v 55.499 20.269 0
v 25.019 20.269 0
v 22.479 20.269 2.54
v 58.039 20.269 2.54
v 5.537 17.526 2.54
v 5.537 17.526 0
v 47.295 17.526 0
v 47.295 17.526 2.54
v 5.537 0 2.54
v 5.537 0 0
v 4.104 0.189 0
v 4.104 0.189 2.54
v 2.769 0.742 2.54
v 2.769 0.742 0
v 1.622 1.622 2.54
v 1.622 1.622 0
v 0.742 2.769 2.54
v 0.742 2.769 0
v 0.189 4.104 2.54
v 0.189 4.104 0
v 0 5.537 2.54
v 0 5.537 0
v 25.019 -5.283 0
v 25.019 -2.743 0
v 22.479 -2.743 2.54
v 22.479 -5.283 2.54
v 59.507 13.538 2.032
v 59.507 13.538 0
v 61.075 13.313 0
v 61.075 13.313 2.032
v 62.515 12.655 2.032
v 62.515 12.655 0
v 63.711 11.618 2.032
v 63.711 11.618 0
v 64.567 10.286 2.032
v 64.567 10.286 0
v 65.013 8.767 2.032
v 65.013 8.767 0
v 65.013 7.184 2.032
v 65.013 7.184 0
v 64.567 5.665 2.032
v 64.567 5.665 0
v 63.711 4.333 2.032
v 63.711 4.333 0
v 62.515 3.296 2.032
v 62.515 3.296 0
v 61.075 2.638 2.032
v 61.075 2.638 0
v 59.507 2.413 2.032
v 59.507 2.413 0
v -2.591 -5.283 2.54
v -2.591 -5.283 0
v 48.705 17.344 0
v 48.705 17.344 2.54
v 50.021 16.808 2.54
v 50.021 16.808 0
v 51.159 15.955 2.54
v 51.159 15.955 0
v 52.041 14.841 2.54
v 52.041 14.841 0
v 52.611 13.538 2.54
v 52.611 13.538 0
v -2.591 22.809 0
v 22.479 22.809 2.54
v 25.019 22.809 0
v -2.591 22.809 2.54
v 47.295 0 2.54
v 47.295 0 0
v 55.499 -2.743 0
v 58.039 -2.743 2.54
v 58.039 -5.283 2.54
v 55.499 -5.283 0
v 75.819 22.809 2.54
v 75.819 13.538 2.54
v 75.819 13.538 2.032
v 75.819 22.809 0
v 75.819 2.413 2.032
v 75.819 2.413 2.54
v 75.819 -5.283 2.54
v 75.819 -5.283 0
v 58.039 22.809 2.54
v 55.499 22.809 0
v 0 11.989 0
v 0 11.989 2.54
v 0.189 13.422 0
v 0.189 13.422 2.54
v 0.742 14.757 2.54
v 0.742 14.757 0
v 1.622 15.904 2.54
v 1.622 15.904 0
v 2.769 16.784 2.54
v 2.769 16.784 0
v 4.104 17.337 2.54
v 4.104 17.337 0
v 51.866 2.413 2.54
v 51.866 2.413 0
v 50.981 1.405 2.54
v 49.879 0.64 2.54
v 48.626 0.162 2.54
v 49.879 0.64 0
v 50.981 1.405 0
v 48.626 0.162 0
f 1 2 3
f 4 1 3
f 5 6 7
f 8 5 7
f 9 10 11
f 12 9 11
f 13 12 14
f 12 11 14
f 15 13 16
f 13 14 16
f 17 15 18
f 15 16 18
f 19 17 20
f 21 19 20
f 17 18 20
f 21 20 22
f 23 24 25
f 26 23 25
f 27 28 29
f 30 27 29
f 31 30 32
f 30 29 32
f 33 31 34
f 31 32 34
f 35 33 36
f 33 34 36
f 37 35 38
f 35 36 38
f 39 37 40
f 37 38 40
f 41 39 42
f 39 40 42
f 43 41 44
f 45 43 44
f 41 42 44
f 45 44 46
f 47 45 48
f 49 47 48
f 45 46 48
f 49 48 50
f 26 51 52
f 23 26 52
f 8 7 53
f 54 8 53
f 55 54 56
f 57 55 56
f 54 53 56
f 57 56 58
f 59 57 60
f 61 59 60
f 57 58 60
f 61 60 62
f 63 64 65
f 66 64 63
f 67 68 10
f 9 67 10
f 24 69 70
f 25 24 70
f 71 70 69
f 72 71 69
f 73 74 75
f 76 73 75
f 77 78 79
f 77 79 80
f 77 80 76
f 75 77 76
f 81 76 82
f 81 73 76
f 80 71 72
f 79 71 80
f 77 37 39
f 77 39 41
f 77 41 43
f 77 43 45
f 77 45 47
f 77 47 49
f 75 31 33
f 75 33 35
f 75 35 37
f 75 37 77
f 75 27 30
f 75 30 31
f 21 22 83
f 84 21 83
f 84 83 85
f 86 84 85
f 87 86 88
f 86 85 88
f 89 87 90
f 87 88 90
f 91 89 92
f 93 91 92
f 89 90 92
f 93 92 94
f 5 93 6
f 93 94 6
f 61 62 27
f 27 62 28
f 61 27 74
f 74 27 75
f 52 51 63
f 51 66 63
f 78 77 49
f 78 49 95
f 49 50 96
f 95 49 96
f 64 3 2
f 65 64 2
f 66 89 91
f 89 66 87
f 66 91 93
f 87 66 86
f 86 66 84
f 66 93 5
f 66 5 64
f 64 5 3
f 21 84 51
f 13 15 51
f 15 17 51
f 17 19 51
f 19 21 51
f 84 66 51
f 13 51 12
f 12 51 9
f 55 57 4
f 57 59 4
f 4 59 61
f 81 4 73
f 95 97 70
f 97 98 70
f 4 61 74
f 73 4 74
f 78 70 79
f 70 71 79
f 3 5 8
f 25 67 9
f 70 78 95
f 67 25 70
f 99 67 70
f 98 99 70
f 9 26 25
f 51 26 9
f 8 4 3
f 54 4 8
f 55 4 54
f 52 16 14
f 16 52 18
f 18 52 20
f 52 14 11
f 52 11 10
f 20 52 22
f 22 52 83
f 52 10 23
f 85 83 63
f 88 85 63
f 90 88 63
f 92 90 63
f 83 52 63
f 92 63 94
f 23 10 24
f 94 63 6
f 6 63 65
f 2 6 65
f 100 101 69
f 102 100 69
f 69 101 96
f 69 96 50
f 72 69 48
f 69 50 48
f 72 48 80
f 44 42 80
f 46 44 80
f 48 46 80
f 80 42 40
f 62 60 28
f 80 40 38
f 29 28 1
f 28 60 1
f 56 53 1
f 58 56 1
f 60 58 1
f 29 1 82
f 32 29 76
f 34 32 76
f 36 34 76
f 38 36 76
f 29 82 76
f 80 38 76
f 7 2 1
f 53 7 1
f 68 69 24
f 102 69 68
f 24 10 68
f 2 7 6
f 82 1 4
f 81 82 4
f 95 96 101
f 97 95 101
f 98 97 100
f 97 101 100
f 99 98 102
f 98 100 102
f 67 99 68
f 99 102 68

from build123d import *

# Parameters (mm, degrees)
F1_DEPTH = 2.54
F3_DEPTH = 2.54
F5_DEPTH = 2.54
F6_DEPTH = 2.032


with BuildPart() as f1:
    # F0 (on Top) → F1 (new body)
    with BuildSketch(Plane.XY):
        with BuildLine():
            ThreePointArc((5.5372, 0), (1.621808, 1.621808), (0, 5.5372))
            Line((0, 5.5372), (0, 11.9888))
            ThreePointArc((0, 11.9888), (1.621808, 15.904192), (5.5372, 17.526))
            Line((5.5372, 17.526), (47.2948, 17.526))
            ThreePointArc((47.2948, 17.526), (50.617543, 16.418242), (52.610808, 13.5382))
            Line((52.610808, 13.5382), (59.50739, 13.5382))
            Line((59.50739, 13.5382), (75.818647, 13.5382))
            Line((75.818647, 13.5382), (75.818647, 20.2692))
            Line((75.818647, 20.2692), (-2.5908, 20.2692))
            Line((-2.5908, 20.2692), (-2.5908, -2.7432))
            Line((-2.5908, -2.7432), (75.818647, -2.7432))
            Line((75.818647, -2.7432), (75.818647, 2.413))
            Line((75.818647, 2.413), (59.50739, 2.413))
            Line((59.50739, 2.413), (51.866447, 2.413))
            ThreePointArc((51.866447, 2.413), (49.879492, 0.640267), (47.2948, 0))
            Line((47.2948, 0), (5.5372, 0))
        make_face()
    extrude(amount=F1_DEPTH)

    # F2 (on face) → F3 (join)
    with BuildSketch(Plane.XZ.offset(2.7432)):
        Polygon((-2.5908, 0), (25.018647, 0), (22.478647, 2.54), (-2.5908, 2.54), align=None)
        Polygon((58.038647, 2.54), (55.498647, 0), (75.818647, 0), (75.818647, 2.54), align=None)
    extrude(amount=F3_DEPTH)

    # F4 (on face) → F5 (join)
    with BuildSketch(Plane(origin=(0, 20.2692, 0), x_dir=(-1, 0, 0), z_dir=(0, 1, 0))):
        Polygon((-75.818647, 0), (-55.498647, 0), (-58.038647, 2.54), (-75.818647, 2.54), align=None)
        Polygon((-22.478647, 2.54), (-25.018647, 0), (2.5908, 0), (2.5908, 2.54), align=None)
    extrude(amount=F5_DEPTH)

    # F0 (on Top) → F6 (join)
    with BuildSketch(Plane.XY):
        with BuildLine():
            ThreePointArc((59.50739, 13.5382), (65.06999, 7.9756), (59.50739, 2.413))
            Line((59.50739, 2.413), (75.818647, 2.413))
            Line((75.818647, 2.413), (75.818647, 13.5382))
            Line((75.818647, 13.5382), (59.50739, 13.5382))
        make_face()
    extrude(amount=F6_DEPTH)


solid = f1.part
